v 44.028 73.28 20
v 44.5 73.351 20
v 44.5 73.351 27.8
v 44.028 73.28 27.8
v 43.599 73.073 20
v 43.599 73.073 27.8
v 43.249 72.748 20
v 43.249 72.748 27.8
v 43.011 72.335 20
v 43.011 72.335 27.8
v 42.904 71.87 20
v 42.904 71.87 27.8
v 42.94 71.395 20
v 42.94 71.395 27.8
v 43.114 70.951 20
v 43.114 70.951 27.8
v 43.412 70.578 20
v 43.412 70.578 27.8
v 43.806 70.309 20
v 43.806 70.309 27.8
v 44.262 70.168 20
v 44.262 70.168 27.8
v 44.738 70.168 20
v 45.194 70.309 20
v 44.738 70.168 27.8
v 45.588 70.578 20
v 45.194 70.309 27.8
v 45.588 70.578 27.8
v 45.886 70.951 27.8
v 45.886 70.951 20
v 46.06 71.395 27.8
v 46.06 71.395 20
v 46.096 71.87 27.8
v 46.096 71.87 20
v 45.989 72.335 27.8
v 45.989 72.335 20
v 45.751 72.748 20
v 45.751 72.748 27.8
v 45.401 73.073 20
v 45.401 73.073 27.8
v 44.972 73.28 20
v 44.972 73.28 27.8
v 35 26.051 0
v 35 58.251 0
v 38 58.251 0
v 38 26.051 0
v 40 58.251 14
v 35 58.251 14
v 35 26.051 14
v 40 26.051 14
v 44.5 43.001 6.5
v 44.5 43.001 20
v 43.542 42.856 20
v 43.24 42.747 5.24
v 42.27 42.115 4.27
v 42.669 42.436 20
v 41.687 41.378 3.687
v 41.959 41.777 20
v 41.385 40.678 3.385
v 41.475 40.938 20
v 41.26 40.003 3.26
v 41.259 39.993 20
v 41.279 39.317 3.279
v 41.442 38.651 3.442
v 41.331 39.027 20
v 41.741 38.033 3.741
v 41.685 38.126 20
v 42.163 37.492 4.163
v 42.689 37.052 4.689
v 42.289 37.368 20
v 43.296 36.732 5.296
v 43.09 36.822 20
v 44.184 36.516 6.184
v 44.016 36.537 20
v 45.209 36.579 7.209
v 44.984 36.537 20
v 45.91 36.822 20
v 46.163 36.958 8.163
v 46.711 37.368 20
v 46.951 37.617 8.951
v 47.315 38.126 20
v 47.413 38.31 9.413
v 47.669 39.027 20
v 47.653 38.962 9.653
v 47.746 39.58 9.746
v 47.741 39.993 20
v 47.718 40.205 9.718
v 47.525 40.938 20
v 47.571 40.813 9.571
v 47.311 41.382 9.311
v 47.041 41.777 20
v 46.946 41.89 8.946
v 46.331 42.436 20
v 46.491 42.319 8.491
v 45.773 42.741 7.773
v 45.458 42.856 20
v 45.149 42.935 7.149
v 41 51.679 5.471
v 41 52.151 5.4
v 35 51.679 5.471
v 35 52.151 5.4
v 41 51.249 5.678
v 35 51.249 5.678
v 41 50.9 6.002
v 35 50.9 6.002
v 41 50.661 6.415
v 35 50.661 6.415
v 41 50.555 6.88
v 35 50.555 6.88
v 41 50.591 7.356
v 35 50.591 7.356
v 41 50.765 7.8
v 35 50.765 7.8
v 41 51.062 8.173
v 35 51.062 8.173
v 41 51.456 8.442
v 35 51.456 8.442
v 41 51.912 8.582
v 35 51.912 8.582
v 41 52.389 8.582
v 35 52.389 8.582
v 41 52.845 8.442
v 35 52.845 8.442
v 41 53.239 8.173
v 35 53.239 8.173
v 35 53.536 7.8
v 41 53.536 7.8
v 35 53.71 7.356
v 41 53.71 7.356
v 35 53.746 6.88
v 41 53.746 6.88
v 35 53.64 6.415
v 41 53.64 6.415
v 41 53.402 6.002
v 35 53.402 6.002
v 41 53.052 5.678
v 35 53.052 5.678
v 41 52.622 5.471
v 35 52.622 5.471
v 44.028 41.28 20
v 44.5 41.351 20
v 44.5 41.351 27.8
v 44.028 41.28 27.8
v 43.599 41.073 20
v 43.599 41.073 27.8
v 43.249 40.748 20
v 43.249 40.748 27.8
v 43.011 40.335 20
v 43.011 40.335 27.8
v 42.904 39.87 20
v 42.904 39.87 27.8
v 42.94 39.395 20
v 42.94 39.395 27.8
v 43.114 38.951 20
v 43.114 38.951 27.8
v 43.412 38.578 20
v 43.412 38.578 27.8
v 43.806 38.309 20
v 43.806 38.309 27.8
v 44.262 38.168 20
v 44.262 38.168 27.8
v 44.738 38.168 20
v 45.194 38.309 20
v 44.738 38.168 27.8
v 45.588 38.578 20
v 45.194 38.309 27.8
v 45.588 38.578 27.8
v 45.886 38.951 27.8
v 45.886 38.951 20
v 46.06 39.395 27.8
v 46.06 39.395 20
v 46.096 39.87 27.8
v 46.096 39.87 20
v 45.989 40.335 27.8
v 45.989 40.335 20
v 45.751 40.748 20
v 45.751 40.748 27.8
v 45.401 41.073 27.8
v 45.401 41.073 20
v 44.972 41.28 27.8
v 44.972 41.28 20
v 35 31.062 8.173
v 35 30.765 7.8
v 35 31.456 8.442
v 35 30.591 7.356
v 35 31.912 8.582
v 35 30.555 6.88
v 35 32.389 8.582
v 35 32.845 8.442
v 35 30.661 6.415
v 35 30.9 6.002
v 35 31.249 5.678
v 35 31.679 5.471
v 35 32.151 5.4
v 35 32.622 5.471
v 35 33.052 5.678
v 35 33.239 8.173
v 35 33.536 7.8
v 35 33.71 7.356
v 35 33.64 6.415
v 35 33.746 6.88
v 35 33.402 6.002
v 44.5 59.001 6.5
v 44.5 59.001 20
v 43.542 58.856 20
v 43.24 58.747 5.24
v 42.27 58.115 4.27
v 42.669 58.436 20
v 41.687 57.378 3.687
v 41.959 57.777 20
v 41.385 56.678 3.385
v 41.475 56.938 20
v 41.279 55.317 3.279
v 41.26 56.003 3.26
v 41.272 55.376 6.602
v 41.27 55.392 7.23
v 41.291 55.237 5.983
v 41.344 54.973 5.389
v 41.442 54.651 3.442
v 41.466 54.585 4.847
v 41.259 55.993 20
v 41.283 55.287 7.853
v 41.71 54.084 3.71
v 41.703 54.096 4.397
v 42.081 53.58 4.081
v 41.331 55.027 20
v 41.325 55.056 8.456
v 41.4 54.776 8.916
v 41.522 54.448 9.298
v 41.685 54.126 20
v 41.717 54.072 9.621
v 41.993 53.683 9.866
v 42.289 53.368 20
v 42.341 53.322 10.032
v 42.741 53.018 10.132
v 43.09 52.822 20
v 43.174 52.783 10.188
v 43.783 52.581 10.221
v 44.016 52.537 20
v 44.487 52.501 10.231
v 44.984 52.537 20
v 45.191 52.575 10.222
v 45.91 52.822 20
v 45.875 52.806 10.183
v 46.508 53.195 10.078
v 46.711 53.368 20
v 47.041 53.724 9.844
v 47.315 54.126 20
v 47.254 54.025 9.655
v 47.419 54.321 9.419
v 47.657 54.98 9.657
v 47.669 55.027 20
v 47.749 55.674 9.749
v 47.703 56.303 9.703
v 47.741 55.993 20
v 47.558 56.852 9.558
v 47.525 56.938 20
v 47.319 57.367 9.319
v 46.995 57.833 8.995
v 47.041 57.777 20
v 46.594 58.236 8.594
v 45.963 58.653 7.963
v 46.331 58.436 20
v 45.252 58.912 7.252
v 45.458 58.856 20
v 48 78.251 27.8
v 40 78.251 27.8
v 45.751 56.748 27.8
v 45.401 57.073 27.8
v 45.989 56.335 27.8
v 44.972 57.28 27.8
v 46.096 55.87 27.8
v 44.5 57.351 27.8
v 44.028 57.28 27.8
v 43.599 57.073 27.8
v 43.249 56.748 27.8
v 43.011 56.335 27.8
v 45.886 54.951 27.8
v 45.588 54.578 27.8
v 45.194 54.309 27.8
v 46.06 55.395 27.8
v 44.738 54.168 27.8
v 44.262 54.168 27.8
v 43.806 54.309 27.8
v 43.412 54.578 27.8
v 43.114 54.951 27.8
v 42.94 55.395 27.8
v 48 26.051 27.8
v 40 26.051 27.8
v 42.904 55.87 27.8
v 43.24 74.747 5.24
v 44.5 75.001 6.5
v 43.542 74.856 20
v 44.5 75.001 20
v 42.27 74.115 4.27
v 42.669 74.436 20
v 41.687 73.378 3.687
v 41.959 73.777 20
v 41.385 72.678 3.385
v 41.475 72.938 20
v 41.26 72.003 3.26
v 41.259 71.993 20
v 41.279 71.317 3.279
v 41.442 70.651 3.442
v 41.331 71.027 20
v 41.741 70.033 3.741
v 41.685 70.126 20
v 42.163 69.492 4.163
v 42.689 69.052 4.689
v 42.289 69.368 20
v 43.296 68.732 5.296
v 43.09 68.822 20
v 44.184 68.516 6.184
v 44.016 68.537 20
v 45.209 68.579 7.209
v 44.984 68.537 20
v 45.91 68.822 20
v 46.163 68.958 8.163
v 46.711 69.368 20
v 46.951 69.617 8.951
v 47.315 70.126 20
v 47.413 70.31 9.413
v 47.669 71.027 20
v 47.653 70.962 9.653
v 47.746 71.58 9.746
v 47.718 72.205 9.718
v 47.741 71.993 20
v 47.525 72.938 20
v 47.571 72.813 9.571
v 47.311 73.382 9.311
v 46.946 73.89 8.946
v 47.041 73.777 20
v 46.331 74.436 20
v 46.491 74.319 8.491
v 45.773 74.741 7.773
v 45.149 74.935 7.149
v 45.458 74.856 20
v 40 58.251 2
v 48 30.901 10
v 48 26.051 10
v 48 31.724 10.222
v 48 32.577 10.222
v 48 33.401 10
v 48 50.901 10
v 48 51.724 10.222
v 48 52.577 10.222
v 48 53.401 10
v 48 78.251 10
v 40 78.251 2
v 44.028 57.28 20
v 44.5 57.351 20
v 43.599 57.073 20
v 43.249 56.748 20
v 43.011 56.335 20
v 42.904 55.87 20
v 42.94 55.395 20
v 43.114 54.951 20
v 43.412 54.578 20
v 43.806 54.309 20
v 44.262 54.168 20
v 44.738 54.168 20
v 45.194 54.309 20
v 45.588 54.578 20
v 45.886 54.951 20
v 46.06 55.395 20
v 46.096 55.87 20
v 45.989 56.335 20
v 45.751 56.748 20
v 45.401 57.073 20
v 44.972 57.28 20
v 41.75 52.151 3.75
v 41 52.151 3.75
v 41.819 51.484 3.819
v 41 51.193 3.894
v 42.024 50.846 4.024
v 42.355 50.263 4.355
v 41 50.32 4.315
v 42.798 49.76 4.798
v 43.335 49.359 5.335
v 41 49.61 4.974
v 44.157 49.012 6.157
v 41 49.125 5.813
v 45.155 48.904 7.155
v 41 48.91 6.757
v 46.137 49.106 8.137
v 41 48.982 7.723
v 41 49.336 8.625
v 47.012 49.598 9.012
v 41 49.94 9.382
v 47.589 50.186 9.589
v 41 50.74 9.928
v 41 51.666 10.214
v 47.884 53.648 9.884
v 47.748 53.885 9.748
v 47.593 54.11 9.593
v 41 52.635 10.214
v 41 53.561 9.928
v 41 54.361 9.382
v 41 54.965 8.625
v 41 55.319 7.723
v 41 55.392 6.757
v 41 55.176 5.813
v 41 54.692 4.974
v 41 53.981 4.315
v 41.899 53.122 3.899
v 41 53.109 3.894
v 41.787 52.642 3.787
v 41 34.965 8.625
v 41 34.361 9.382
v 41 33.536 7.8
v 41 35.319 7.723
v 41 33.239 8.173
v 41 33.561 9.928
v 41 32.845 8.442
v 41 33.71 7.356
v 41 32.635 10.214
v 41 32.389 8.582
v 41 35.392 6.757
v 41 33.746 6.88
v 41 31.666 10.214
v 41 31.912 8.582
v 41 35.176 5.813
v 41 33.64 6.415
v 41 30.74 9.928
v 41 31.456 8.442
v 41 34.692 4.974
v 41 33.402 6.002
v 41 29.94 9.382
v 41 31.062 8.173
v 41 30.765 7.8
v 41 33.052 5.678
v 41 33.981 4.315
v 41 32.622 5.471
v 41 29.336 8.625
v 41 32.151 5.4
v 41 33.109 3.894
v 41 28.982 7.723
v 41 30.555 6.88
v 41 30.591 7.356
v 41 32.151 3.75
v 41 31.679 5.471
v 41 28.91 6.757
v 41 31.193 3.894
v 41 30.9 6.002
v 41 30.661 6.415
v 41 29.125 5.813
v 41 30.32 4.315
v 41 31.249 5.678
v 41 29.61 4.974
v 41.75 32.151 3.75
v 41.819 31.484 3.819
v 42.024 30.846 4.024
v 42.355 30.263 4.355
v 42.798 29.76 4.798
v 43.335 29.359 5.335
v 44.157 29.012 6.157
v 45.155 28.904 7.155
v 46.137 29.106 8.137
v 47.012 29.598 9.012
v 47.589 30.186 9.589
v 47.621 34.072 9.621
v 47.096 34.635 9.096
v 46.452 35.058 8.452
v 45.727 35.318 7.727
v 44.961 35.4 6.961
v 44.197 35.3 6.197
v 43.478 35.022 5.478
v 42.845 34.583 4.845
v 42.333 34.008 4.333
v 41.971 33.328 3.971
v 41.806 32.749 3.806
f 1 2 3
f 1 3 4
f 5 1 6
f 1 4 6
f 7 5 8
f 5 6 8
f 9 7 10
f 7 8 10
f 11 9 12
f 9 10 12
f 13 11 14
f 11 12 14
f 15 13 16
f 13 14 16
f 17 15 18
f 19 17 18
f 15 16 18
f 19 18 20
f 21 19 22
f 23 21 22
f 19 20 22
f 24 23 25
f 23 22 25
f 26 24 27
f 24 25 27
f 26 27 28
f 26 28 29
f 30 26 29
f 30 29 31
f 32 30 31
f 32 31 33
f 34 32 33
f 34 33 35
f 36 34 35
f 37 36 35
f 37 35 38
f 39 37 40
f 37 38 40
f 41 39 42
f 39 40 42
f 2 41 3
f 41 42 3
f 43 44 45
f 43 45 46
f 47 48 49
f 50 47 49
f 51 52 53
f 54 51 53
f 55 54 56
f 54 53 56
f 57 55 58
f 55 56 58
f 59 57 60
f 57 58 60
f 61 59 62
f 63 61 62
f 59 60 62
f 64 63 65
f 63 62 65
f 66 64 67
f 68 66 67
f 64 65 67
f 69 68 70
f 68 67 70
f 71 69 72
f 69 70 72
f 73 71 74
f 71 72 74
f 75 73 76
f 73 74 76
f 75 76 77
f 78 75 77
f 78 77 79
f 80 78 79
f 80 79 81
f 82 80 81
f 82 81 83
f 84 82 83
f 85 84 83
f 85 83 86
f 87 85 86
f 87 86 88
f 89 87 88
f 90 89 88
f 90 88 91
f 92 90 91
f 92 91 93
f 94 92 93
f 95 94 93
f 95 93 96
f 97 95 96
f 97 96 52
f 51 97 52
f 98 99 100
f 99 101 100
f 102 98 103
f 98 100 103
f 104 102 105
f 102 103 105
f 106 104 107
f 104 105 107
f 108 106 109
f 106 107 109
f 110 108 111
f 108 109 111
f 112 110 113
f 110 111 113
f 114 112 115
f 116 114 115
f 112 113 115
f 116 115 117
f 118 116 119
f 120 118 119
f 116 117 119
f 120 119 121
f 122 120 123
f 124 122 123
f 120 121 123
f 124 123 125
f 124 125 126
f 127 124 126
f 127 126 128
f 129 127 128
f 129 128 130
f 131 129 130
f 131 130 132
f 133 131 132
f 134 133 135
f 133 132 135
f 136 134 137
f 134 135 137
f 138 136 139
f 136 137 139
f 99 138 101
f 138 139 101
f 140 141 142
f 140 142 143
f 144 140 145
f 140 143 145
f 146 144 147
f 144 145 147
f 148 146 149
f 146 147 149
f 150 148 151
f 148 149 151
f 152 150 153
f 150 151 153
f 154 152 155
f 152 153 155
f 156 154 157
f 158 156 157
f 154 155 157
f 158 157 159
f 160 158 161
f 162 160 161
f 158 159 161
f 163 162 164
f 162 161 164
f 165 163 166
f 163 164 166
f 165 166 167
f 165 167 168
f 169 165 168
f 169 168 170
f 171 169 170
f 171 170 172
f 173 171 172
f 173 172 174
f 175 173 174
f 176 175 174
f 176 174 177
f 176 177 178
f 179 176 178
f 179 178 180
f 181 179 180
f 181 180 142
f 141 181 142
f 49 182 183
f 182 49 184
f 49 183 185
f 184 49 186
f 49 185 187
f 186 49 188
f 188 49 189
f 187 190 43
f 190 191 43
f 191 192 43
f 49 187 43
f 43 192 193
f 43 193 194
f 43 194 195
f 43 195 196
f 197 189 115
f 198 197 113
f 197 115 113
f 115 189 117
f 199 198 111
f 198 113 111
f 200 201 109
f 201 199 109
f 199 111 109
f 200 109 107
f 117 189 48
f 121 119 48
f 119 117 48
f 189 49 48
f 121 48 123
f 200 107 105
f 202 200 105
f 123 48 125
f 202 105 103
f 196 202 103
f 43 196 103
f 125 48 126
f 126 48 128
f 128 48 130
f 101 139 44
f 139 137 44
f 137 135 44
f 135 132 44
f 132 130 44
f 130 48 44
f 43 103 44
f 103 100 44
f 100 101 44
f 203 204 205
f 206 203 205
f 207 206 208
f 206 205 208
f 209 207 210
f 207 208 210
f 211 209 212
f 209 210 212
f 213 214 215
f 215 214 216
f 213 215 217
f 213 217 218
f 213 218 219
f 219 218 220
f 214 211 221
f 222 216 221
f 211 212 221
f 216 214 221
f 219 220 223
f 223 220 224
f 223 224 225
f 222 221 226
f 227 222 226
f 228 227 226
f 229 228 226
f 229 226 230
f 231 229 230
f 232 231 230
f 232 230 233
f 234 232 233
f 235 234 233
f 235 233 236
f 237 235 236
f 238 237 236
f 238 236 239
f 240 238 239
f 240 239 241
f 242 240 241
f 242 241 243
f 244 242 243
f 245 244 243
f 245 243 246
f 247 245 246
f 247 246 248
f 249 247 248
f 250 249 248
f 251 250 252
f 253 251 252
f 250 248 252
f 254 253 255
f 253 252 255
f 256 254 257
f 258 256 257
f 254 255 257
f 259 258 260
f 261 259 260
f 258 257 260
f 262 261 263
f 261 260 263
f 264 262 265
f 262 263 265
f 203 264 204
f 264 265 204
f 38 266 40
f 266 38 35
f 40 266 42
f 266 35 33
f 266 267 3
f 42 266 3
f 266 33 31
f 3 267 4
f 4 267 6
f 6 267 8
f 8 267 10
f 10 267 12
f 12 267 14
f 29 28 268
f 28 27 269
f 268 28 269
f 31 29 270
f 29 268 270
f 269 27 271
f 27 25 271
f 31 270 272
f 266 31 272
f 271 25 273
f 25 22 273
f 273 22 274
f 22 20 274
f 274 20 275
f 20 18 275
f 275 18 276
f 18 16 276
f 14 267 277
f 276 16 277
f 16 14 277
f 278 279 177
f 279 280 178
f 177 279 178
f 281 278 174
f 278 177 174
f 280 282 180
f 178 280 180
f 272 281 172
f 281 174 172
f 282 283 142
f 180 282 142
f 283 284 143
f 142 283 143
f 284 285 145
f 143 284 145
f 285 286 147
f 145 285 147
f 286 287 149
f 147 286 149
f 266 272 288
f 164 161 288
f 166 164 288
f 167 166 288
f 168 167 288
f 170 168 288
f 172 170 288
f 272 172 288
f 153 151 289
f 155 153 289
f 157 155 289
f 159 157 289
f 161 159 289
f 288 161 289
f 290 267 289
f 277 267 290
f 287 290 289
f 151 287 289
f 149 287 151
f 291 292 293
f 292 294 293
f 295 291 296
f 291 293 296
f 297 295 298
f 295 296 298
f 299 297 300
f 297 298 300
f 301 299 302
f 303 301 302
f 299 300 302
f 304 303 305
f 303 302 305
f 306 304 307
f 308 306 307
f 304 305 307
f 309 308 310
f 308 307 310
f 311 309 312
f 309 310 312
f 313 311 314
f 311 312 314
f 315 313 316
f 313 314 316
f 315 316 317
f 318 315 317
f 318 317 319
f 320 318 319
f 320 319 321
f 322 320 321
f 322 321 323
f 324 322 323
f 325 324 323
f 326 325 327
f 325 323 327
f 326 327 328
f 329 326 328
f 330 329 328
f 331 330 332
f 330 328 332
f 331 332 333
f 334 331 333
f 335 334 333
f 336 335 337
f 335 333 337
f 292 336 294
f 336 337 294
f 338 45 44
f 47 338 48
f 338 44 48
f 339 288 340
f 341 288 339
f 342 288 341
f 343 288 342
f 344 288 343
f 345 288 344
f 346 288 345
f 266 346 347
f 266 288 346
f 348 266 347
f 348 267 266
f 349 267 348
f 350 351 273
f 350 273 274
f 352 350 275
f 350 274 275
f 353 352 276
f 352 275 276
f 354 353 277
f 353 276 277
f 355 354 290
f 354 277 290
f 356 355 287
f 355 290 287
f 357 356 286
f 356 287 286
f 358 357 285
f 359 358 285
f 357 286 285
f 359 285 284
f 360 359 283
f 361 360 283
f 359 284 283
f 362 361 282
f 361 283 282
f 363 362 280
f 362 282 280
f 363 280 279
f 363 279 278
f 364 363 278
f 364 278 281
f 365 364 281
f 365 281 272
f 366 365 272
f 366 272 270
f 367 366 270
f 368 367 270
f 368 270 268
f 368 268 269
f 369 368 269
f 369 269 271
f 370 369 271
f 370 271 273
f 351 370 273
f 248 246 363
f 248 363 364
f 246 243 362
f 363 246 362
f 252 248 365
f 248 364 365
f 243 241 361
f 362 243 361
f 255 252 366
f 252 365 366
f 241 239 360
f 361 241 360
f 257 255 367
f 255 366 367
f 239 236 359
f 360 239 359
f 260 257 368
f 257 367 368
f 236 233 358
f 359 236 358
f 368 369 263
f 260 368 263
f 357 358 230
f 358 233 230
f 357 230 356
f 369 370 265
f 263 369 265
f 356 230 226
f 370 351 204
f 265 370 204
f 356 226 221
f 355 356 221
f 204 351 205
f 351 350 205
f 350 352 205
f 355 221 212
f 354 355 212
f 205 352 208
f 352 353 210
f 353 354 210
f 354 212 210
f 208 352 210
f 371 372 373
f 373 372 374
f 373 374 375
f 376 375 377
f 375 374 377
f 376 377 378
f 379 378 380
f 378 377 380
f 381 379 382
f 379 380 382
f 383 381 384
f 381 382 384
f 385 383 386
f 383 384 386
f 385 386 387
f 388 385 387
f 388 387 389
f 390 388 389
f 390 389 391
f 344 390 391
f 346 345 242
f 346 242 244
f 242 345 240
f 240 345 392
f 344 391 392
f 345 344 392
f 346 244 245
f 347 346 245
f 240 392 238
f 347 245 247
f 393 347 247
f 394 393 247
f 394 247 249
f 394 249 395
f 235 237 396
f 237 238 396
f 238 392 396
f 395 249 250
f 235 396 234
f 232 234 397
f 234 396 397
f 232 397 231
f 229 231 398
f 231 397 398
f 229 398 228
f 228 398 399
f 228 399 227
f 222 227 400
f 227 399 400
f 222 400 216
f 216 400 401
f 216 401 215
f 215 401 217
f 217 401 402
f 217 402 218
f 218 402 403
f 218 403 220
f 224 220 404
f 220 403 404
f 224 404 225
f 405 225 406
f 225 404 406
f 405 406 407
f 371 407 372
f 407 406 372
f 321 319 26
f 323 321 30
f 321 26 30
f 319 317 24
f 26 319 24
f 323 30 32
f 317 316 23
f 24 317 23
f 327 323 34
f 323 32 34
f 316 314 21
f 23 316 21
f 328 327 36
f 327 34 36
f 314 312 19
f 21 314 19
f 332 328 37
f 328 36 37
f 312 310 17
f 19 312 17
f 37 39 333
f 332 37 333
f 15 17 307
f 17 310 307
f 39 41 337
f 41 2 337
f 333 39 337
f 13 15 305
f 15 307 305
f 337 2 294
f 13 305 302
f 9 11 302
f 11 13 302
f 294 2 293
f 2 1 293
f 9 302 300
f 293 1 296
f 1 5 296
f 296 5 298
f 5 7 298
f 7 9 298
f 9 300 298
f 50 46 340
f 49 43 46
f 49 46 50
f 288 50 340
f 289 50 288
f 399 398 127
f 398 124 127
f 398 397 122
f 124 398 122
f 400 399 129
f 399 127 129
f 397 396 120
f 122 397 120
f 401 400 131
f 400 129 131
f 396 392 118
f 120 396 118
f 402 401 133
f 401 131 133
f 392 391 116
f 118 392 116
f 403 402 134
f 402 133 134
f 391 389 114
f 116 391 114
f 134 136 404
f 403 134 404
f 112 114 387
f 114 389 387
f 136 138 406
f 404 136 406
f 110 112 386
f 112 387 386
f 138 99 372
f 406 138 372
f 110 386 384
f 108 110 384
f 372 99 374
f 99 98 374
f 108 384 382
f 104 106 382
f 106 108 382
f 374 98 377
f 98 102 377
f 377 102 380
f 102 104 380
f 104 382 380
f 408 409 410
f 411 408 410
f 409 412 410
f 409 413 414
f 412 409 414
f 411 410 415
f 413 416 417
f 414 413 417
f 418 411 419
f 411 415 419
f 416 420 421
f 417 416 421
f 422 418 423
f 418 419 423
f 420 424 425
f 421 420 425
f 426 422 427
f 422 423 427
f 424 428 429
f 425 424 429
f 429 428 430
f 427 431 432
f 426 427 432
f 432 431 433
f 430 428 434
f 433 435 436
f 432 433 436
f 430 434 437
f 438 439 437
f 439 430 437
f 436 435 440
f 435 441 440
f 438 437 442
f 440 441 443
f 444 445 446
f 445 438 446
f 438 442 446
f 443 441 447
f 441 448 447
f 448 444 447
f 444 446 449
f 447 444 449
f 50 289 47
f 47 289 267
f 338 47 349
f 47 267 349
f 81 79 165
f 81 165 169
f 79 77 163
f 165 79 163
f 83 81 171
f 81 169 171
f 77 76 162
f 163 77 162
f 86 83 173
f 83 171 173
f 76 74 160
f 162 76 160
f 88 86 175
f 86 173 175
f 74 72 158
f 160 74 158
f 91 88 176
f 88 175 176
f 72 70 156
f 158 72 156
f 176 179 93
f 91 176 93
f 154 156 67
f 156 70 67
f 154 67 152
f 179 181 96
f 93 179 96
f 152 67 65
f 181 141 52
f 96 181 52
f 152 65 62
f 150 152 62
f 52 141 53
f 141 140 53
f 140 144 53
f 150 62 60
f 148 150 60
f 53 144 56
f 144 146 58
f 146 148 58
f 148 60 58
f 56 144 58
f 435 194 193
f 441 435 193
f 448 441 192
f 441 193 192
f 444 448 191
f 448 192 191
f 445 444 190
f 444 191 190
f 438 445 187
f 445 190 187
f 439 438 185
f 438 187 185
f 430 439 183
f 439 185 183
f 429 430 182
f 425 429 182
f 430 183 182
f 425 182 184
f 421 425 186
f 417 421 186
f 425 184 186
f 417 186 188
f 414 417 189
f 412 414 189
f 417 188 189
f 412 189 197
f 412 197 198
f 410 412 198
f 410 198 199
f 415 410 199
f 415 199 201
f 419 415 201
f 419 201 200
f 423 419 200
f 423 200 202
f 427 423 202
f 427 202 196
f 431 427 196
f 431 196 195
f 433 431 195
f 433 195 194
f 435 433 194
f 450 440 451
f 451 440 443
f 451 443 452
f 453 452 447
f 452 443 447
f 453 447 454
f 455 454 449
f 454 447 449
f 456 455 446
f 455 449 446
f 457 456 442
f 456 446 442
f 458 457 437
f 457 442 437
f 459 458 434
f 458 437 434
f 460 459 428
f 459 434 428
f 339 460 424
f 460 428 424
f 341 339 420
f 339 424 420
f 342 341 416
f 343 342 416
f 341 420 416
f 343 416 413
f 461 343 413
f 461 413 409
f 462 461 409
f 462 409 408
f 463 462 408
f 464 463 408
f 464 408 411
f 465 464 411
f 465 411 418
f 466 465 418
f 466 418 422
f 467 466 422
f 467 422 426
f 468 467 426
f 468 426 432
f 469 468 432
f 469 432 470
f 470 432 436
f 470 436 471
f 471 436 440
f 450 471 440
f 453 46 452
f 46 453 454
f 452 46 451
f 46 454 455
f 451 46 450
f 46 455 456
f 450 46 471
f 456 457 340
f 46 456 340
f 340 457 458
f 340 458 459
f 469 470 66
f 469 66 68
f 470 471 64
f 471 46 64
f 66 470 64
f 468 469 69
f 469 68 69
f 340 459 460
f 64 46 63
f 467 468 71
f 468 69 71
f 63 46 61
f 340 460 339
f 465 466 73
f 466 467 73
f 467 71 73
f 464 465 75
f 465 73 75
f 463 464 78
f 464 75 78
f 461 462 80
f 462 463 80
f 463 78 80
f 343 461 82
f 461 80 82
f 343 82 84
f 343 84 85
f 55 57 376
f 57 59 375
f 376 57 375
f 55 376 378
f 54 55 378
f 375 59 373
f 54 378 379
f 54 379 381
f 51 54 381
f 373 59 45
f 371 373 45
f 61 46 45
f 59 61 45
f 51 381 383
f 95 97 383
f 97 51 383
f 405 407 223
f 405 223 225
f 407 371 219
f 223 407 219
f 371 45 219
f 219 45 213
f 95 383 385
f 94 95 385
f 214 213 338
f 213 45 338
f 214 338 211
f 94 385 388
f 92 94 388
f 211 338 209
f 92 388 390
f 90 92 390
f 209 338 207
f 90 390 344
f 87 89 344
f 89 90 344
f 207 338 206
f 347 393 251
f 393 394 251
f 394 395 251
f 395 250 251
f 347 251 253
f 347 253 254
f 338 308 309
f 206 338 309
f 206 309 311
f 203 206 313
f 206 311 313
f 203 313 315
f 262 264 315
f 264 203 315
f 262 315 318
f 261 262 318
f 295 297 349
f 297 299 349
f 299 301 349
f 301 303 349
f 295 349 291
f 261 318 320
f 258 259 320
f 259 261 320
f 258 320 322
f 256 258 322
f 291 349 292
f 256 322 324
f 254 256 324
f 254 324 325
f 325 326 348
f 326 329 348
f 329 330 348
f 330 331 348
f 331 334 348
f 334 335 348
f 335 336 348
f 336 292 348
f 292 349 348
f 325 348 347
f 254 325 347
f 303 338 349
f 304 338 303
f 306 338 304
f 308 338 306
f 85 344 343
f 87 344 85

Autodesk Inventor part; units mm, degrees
ref_plane "YZ Plane" through (0, 0, 0) normal (1, 0, 0) x (0, 1, 0)
ref_plane "XZ Plane" through (0, 0, 0) normal (0, 1, 0) x (-1, 0, 0)
ref_plane "XY Plane" through (0, 0, 0) normal (0, 0, 1) x (1, 0, 0)
ref_plane "Arbeitsebene2" through (35, 26.0506, 0) normal (1, 0, 0) x (0, 0, -1)
sketch "Skizze6" plane through (35, 26.0506, 0) normal (1, 0, 0) x (0, 0, -1)
  line L0 (-14, 32.2) -> (-14, 0) projected
  line L1 (0, 0) -> (-14, 0) projected
  line L2 (0, 32.2) -> (0, 0) projected
  line L3 (0, 32.2) -> (-14, 32.2) projected
  line L4 (-8.5, 27.35) -> (0, 27.35)
  line L5 (-8.5, 24.85) -> (0, 24.85)
  line L6 (-8.5, 7.35) -> (0, 7.35)
  line L7 (-8.5, 4.85) -> (0, 4.85)
  circle A0 centre (-7, 26.1) radius 1.6
  circle A1 centre (-7, 6.1) radius 1.6
  point P0 (0, -26.0506)
  dimension "d40" = 3.2
  dimension "d41" = 3.2
  dimension "d42" = 1.25
  dimension "d43" = 1.25
  dimension "d44" = 7
  dimension "d45" = 7
extrude "Extrusion6" add sketch "Skizze6" along normal blind 5 contours L3 L2 L4 A0 L5 L6 A1 L7 L1 L0 | L2 L5 A0 L4 | L7 A1 L6 L2
sketch "Skizze7" plane through (40, 26.0506, 0) normal (1, 0, 0) x (0, 0, -1)
  line L0 (0, 32.2) -> (-14, 32.2) projected
  line L1 (-14, 32.2) -> (-14, 0) projected
  line L2 (-14, 0) -> (0, 0) projected
  line L3 (0, 0) -> (0, 32.2) projected
  circle A0 centre (-7, 26.1) radius 1.6 projected
  circle A1 centre (-7, 6.1) radius 1.6 projected
  line L4 (-58.75, 26.0265) -> (-58.75, 86.0265) projected
  line L5 (0, 32.2) -> (-27.8, 32.2)
  line L6 (-27.8, 32.2) -> (-27.8, 0)
  line L7 (-27.8, 0) -> (0, 0)
  line L8 (0, 0) -> (0, 32.2)
  line L9 (0, 32.2) -> (-14, 32.2) projected
  line L10 (0, 32.2) -> (-27.8, 32.2)
  line L11 (-27.8, 32.2) -> (-27.8, 52.2)
  line L12 (-27.8, 52.2) -> (0, 52.2)
  line L13 (0, 52.2) -> (0, 32.2)
  point P0 (0, -26.0506)
  point P1 (-14, 0)
  point P2 (-14, 32.2)
  dimension "d48" = 27.8
  dimension "d51" = 20
extrude "Extrusion7" add sketch "Skizze7" along normal blind 8
sketch "Skizze8" plane through (35, 26.0506, 0) normal (0, 0, -1) x (-1, 0, 0)
  line L0 (-13, 24.5) -> (0, 24.5) projected
  line L1 (-13, 27.7) -> (0, 27.7) projected
  line L2 (-13, 7.7) -> (0, 7.7) projected
  line L3 (-13, 4.5) -> (0, 4.5) projected
  line L4 (0, 0) -> (0, 32.2) projected
  line L5 (0, 32.2) -> (-5, 32.2) projected
  line L6 (-5, 32.2) -> (-5, 52.2) projected
  line L7 (-5, 52.2) -> (-13, 52.2) projected
  line L8 (-13, 0) -> (-13, 52.2) projected
  line L9 (0, 0) -> (-13, 0) projected
  circle A0 centre (-9.5, 39.8052) radius 1.6 construction
  circle A1 centre (-9.5, 13.7) radius 1.4 construction
  circle A2 centre (-9.5, 29.7) radius 1.4 construction
  circle A3 centre (-9.5, 45.7) radius 1.4 construction
  point P0 (35, -26.0506)
  dimension "d52" = 2.8
  dimension "d53" = 3.5
  dimension "d54" = 6
  dimension "d55" = 2.8
  dimension "d56" = 16
  dimension "d57" = 2.8
  dimension "d58" = 16
hole "Bohrung1" at (44.5, 39.7506, 0) at (44.5, 55.7506, 0) at (44.5, 71.7506, 0) direction (0, 0, 1) diameter 3.2 end through all counterbore diameter 6.5 counterbore depth 20
chamfer "Fase4" distance 10 angle 45 1 edges at (48, 52.1506, 0)
sketch "Skizze9" plane through (48, 26.0506, 0) normal (1, 0, 0) x (0, 0, -1)
  circle A0 centre (-7, 6.1) radius 1.6 projected
  arc A1 (-8.3185, 27.0064) -> (-5.4844, 26.6128) centre (-7, 26.1) ccw projected
  point P0 (0, -26.0506)
hole "Bohrung2" at (48, 32.1506, 7) at (48, 52.1506, 7) direction (-1, 0, 0) diameter 3.2 end through all counterbore diameter 6.5 counterbore depth 7
properties part number "30_XYTable_Aliexpress_Translatorarm_y"
